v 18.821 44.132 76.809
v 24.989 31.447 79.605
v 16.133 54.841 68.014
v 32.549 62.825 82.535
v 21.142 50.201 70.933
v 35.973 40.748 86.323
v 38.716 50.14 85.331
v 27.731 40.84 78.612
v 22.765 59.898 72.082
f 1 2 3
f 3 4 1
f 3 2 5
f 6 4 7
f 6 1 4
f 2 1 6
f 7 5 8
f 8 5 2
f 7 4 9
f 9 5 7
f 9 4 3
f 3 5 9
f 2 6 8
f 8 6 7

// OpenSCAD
// Auto-generated auxetic polyhedron
points = [
    [16.133461, 54.841127, 68.013537],
    [24.988792, 31.447166, 79.604793],
    [18.821493, 44.131870, 76.809289],
    [32.548540, 62.825005, 82.535002],
    [21.142415, 50.200646, 70.933277],
    [38.715839, 50.140302, 85.330507],
    [35.973174, 40.747794, 86.322861],
    [27.731457, 40.839674, 78.612439],
    [22.764670, 59.897969, 72.082260],
];

faces = [
    [0, 1, 2],
    [2, 3, 0],
    [4, 1, 0],
    [5, 3, 6],
    [3, 2, 6],
    [6, 2, 1],
    [7, 4, 5],
    [1, 4, 7],
    [8, 3, 5],
    [5, 4, 8],
    [0, 3, 8],
    [8, 4, 0],
    [7, 6, 1],
    [5, 6, 7],
];

polyhedron(points = points, faces = faces);
